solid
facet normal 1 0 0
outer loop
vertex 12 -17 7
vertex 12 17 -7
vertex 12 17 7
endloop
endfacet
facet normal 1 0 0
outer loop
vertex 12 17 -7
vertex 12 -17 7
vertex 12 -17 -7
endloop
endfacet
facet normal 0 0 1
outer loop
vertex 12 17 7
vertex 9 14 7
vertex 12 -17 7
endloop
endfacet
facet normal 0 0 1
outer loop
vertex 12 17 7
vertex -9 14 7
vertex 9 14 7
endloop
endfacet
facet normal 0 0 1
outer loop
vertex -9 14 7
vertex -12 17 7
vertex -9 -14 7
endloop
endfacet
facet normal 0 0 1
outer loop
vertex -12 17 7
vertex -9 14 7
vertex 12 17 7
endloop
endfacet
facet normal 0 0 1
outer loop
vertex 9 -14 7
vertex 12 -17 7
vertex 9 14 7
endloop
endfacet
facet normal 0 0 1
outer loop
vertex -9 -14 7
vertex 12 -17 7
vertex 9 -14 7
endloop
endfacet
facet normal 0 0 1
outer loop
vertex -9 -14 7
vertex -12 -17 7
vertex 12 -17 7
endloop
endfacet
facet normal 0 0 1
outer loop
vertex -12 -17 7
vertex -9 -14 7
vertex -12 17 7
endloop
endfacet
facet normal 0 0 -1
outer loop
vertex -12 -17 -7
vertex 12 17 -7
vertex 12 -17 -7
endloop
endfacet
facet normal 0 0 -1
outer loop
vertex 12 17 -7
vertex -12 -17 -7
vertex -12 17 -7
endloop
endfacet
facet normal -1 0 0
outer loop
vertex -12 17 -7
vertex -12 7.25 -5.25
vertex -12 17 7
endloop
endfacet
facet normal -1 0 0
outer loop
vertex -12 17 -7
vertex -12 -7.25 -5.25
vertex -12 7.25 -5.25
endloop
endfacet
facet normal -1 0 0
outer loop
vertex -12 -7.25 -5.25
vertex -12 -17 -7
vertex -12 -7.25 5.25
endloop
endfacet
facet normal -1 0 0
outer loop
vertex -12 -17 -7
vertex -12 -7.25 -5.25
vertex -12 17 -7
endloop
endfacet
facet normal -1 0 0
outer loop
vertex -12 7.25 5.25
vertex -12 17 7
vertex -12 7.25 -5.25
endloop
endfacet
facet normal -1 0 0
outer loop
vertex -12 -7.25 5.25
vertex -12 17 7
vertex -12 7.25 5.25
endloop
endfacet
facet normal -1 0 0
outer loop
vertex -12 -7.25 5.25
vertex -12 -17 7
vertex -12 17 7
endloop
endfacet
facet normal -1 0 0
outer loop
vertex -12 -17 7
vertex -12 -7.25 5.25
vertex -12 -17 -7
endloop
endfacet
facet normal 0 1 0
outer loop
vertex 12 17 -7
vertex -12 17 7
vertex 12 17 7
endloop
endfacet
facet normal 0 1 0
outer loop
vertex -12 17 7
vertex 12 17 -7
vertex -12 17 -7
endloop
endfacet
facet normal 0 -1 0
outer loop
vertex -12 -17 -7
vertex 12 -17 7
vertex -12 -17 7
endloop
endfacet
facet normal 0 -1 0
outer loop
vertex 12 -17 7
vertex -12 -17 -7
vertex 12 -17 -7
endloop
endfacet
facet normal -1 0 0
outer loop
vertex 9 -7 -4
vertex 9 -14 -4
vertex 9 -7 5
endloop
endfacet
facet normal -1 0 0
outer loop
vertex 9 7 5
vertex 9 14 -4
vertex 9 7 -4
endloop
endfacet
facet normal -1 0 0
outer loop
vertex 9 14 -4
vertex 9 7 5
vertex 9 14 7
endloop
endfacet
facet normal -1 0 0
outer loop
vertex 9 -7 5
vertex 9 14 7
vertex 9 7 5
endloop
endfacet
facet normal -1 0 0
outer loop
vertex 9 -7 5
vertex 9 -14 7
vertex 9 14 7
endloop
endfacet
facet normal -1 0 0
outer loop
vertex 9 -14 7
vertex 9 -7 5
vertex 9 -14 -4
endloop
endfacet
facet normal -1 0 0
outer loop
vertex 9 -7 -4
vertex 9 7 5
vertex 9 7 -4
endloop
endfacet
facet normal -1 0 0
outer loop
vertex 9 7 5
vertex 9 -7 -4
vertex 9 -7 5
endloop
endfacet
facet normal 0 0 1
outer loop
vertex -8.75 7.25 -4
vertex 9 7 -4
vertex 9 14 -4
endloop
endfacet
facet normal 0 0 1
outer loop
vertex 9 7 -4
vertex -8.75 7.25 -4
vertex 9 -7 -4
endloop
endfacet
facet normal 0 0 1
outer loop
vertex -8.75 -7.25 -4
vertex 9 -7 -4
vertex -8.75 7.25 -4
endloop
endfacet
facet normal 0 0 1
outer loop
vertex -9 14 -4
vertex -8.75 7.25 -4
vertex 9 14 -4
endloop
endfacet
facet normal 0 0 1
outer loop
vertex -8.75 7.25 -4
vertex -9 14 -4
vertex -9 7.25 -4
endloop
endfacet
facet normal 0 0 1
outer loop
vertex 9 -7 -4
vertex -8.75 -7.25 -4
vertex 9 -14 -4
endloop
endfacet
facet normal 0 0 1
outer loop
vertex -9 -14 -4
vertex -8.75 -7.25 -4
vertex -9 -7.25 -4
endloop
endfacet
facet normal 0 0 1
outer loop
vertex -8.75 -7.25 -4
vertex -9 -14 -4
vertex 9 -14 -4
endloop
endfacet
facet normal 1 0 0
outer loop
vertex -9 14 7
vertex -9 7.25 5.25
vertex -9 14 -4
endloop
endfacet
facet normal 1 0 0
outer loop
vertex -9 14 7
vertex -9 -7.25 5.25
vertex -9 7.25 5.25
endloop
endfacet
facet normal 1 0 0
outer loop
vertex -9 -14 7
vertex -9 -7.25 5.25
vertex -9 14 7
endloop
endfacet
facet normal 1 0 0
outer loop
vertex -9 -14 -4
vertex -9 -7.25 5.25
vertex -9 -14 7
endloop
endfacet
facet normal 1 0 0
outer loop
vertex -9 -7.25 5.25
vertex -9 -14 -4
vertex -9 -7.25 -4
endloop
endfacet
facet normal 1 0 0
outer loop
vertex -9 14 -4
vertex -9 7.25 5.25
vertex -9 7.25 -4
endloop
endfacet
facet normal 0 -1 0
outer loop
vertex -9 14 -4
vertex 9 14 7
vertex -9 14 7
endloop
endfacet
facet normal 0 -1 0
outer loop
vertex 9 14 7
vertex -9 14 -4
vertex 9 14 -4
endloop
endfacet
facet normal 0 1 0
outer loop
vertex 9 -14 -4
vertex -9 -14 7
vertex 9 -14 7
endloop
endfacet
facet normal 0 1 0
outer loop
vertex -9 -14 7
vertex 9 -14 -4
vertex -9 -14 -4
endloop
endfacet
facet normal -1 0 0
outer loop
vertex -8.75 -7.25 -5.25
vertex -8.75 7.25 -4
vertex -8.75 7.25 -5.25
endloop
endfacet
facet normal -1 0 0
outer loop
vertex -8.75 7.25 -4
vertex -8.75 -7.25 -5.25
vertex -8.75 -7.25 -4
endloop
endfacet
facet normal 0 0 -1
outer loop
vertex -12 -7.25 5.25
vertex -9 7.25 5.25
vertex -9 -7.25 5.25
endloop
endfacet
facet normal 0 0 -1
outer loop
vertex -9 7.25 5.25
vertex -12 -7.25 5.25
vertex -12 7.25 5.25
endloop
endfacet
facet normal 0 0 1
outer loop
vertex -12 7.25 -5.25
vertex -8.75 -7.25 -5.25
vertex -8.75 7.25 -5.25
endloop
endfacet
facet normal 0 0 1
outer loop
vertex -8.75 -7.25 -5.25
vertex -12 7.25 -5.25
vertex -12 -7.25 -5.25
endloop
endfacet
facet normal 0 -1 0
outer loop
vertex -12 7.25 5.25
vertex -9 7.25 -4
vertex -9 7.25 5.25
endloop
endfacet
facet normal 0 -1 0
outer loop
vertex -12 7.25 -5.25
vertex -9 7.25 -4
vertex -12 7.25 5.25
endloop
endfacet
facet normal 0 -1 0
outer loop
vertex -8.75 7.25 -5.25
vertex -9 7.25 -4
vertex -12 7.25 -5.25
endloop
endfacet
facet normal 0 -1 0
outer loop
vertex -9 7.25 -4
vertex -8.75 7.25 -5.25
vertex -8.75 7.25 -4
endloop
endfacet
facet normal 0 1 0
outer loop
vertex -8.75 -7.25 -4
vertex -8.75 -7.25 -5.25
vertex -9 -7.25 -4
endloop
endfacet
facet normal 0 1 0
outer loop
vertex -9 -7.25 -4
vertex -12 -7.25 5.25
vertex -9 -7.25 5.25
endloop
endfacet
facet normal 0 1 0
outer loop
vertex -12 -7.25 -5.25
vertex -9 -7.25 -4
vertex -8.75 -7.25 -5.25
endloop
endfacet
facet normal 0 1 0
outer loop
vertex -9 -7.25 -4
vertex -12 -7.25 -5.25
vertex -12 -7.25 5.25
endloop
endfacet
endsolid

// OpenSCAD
// TS-PET-C08 - Track Endcap Window
$fn = 72; cap_len = 24; outer_w = 34; track_h = 14; wall_t = 3; join_w=14; join_t=3; join_h=10;
difference(){ cube([cap_len, outer_w, track_h], center=true); translate([0,0,wall_t]) cube([cap_len-2*wall_t, outer_w-2*wall_t, track_h], center=true); translate([-cap_len/2+join_t/2,0,0]) cube([join_t+0.5, join_w+0.5, join_h+0.5], center=true);} translate([cap_len/2-join_t/2,0,0]) cube([join_t, join_w, join_h], center=true);
